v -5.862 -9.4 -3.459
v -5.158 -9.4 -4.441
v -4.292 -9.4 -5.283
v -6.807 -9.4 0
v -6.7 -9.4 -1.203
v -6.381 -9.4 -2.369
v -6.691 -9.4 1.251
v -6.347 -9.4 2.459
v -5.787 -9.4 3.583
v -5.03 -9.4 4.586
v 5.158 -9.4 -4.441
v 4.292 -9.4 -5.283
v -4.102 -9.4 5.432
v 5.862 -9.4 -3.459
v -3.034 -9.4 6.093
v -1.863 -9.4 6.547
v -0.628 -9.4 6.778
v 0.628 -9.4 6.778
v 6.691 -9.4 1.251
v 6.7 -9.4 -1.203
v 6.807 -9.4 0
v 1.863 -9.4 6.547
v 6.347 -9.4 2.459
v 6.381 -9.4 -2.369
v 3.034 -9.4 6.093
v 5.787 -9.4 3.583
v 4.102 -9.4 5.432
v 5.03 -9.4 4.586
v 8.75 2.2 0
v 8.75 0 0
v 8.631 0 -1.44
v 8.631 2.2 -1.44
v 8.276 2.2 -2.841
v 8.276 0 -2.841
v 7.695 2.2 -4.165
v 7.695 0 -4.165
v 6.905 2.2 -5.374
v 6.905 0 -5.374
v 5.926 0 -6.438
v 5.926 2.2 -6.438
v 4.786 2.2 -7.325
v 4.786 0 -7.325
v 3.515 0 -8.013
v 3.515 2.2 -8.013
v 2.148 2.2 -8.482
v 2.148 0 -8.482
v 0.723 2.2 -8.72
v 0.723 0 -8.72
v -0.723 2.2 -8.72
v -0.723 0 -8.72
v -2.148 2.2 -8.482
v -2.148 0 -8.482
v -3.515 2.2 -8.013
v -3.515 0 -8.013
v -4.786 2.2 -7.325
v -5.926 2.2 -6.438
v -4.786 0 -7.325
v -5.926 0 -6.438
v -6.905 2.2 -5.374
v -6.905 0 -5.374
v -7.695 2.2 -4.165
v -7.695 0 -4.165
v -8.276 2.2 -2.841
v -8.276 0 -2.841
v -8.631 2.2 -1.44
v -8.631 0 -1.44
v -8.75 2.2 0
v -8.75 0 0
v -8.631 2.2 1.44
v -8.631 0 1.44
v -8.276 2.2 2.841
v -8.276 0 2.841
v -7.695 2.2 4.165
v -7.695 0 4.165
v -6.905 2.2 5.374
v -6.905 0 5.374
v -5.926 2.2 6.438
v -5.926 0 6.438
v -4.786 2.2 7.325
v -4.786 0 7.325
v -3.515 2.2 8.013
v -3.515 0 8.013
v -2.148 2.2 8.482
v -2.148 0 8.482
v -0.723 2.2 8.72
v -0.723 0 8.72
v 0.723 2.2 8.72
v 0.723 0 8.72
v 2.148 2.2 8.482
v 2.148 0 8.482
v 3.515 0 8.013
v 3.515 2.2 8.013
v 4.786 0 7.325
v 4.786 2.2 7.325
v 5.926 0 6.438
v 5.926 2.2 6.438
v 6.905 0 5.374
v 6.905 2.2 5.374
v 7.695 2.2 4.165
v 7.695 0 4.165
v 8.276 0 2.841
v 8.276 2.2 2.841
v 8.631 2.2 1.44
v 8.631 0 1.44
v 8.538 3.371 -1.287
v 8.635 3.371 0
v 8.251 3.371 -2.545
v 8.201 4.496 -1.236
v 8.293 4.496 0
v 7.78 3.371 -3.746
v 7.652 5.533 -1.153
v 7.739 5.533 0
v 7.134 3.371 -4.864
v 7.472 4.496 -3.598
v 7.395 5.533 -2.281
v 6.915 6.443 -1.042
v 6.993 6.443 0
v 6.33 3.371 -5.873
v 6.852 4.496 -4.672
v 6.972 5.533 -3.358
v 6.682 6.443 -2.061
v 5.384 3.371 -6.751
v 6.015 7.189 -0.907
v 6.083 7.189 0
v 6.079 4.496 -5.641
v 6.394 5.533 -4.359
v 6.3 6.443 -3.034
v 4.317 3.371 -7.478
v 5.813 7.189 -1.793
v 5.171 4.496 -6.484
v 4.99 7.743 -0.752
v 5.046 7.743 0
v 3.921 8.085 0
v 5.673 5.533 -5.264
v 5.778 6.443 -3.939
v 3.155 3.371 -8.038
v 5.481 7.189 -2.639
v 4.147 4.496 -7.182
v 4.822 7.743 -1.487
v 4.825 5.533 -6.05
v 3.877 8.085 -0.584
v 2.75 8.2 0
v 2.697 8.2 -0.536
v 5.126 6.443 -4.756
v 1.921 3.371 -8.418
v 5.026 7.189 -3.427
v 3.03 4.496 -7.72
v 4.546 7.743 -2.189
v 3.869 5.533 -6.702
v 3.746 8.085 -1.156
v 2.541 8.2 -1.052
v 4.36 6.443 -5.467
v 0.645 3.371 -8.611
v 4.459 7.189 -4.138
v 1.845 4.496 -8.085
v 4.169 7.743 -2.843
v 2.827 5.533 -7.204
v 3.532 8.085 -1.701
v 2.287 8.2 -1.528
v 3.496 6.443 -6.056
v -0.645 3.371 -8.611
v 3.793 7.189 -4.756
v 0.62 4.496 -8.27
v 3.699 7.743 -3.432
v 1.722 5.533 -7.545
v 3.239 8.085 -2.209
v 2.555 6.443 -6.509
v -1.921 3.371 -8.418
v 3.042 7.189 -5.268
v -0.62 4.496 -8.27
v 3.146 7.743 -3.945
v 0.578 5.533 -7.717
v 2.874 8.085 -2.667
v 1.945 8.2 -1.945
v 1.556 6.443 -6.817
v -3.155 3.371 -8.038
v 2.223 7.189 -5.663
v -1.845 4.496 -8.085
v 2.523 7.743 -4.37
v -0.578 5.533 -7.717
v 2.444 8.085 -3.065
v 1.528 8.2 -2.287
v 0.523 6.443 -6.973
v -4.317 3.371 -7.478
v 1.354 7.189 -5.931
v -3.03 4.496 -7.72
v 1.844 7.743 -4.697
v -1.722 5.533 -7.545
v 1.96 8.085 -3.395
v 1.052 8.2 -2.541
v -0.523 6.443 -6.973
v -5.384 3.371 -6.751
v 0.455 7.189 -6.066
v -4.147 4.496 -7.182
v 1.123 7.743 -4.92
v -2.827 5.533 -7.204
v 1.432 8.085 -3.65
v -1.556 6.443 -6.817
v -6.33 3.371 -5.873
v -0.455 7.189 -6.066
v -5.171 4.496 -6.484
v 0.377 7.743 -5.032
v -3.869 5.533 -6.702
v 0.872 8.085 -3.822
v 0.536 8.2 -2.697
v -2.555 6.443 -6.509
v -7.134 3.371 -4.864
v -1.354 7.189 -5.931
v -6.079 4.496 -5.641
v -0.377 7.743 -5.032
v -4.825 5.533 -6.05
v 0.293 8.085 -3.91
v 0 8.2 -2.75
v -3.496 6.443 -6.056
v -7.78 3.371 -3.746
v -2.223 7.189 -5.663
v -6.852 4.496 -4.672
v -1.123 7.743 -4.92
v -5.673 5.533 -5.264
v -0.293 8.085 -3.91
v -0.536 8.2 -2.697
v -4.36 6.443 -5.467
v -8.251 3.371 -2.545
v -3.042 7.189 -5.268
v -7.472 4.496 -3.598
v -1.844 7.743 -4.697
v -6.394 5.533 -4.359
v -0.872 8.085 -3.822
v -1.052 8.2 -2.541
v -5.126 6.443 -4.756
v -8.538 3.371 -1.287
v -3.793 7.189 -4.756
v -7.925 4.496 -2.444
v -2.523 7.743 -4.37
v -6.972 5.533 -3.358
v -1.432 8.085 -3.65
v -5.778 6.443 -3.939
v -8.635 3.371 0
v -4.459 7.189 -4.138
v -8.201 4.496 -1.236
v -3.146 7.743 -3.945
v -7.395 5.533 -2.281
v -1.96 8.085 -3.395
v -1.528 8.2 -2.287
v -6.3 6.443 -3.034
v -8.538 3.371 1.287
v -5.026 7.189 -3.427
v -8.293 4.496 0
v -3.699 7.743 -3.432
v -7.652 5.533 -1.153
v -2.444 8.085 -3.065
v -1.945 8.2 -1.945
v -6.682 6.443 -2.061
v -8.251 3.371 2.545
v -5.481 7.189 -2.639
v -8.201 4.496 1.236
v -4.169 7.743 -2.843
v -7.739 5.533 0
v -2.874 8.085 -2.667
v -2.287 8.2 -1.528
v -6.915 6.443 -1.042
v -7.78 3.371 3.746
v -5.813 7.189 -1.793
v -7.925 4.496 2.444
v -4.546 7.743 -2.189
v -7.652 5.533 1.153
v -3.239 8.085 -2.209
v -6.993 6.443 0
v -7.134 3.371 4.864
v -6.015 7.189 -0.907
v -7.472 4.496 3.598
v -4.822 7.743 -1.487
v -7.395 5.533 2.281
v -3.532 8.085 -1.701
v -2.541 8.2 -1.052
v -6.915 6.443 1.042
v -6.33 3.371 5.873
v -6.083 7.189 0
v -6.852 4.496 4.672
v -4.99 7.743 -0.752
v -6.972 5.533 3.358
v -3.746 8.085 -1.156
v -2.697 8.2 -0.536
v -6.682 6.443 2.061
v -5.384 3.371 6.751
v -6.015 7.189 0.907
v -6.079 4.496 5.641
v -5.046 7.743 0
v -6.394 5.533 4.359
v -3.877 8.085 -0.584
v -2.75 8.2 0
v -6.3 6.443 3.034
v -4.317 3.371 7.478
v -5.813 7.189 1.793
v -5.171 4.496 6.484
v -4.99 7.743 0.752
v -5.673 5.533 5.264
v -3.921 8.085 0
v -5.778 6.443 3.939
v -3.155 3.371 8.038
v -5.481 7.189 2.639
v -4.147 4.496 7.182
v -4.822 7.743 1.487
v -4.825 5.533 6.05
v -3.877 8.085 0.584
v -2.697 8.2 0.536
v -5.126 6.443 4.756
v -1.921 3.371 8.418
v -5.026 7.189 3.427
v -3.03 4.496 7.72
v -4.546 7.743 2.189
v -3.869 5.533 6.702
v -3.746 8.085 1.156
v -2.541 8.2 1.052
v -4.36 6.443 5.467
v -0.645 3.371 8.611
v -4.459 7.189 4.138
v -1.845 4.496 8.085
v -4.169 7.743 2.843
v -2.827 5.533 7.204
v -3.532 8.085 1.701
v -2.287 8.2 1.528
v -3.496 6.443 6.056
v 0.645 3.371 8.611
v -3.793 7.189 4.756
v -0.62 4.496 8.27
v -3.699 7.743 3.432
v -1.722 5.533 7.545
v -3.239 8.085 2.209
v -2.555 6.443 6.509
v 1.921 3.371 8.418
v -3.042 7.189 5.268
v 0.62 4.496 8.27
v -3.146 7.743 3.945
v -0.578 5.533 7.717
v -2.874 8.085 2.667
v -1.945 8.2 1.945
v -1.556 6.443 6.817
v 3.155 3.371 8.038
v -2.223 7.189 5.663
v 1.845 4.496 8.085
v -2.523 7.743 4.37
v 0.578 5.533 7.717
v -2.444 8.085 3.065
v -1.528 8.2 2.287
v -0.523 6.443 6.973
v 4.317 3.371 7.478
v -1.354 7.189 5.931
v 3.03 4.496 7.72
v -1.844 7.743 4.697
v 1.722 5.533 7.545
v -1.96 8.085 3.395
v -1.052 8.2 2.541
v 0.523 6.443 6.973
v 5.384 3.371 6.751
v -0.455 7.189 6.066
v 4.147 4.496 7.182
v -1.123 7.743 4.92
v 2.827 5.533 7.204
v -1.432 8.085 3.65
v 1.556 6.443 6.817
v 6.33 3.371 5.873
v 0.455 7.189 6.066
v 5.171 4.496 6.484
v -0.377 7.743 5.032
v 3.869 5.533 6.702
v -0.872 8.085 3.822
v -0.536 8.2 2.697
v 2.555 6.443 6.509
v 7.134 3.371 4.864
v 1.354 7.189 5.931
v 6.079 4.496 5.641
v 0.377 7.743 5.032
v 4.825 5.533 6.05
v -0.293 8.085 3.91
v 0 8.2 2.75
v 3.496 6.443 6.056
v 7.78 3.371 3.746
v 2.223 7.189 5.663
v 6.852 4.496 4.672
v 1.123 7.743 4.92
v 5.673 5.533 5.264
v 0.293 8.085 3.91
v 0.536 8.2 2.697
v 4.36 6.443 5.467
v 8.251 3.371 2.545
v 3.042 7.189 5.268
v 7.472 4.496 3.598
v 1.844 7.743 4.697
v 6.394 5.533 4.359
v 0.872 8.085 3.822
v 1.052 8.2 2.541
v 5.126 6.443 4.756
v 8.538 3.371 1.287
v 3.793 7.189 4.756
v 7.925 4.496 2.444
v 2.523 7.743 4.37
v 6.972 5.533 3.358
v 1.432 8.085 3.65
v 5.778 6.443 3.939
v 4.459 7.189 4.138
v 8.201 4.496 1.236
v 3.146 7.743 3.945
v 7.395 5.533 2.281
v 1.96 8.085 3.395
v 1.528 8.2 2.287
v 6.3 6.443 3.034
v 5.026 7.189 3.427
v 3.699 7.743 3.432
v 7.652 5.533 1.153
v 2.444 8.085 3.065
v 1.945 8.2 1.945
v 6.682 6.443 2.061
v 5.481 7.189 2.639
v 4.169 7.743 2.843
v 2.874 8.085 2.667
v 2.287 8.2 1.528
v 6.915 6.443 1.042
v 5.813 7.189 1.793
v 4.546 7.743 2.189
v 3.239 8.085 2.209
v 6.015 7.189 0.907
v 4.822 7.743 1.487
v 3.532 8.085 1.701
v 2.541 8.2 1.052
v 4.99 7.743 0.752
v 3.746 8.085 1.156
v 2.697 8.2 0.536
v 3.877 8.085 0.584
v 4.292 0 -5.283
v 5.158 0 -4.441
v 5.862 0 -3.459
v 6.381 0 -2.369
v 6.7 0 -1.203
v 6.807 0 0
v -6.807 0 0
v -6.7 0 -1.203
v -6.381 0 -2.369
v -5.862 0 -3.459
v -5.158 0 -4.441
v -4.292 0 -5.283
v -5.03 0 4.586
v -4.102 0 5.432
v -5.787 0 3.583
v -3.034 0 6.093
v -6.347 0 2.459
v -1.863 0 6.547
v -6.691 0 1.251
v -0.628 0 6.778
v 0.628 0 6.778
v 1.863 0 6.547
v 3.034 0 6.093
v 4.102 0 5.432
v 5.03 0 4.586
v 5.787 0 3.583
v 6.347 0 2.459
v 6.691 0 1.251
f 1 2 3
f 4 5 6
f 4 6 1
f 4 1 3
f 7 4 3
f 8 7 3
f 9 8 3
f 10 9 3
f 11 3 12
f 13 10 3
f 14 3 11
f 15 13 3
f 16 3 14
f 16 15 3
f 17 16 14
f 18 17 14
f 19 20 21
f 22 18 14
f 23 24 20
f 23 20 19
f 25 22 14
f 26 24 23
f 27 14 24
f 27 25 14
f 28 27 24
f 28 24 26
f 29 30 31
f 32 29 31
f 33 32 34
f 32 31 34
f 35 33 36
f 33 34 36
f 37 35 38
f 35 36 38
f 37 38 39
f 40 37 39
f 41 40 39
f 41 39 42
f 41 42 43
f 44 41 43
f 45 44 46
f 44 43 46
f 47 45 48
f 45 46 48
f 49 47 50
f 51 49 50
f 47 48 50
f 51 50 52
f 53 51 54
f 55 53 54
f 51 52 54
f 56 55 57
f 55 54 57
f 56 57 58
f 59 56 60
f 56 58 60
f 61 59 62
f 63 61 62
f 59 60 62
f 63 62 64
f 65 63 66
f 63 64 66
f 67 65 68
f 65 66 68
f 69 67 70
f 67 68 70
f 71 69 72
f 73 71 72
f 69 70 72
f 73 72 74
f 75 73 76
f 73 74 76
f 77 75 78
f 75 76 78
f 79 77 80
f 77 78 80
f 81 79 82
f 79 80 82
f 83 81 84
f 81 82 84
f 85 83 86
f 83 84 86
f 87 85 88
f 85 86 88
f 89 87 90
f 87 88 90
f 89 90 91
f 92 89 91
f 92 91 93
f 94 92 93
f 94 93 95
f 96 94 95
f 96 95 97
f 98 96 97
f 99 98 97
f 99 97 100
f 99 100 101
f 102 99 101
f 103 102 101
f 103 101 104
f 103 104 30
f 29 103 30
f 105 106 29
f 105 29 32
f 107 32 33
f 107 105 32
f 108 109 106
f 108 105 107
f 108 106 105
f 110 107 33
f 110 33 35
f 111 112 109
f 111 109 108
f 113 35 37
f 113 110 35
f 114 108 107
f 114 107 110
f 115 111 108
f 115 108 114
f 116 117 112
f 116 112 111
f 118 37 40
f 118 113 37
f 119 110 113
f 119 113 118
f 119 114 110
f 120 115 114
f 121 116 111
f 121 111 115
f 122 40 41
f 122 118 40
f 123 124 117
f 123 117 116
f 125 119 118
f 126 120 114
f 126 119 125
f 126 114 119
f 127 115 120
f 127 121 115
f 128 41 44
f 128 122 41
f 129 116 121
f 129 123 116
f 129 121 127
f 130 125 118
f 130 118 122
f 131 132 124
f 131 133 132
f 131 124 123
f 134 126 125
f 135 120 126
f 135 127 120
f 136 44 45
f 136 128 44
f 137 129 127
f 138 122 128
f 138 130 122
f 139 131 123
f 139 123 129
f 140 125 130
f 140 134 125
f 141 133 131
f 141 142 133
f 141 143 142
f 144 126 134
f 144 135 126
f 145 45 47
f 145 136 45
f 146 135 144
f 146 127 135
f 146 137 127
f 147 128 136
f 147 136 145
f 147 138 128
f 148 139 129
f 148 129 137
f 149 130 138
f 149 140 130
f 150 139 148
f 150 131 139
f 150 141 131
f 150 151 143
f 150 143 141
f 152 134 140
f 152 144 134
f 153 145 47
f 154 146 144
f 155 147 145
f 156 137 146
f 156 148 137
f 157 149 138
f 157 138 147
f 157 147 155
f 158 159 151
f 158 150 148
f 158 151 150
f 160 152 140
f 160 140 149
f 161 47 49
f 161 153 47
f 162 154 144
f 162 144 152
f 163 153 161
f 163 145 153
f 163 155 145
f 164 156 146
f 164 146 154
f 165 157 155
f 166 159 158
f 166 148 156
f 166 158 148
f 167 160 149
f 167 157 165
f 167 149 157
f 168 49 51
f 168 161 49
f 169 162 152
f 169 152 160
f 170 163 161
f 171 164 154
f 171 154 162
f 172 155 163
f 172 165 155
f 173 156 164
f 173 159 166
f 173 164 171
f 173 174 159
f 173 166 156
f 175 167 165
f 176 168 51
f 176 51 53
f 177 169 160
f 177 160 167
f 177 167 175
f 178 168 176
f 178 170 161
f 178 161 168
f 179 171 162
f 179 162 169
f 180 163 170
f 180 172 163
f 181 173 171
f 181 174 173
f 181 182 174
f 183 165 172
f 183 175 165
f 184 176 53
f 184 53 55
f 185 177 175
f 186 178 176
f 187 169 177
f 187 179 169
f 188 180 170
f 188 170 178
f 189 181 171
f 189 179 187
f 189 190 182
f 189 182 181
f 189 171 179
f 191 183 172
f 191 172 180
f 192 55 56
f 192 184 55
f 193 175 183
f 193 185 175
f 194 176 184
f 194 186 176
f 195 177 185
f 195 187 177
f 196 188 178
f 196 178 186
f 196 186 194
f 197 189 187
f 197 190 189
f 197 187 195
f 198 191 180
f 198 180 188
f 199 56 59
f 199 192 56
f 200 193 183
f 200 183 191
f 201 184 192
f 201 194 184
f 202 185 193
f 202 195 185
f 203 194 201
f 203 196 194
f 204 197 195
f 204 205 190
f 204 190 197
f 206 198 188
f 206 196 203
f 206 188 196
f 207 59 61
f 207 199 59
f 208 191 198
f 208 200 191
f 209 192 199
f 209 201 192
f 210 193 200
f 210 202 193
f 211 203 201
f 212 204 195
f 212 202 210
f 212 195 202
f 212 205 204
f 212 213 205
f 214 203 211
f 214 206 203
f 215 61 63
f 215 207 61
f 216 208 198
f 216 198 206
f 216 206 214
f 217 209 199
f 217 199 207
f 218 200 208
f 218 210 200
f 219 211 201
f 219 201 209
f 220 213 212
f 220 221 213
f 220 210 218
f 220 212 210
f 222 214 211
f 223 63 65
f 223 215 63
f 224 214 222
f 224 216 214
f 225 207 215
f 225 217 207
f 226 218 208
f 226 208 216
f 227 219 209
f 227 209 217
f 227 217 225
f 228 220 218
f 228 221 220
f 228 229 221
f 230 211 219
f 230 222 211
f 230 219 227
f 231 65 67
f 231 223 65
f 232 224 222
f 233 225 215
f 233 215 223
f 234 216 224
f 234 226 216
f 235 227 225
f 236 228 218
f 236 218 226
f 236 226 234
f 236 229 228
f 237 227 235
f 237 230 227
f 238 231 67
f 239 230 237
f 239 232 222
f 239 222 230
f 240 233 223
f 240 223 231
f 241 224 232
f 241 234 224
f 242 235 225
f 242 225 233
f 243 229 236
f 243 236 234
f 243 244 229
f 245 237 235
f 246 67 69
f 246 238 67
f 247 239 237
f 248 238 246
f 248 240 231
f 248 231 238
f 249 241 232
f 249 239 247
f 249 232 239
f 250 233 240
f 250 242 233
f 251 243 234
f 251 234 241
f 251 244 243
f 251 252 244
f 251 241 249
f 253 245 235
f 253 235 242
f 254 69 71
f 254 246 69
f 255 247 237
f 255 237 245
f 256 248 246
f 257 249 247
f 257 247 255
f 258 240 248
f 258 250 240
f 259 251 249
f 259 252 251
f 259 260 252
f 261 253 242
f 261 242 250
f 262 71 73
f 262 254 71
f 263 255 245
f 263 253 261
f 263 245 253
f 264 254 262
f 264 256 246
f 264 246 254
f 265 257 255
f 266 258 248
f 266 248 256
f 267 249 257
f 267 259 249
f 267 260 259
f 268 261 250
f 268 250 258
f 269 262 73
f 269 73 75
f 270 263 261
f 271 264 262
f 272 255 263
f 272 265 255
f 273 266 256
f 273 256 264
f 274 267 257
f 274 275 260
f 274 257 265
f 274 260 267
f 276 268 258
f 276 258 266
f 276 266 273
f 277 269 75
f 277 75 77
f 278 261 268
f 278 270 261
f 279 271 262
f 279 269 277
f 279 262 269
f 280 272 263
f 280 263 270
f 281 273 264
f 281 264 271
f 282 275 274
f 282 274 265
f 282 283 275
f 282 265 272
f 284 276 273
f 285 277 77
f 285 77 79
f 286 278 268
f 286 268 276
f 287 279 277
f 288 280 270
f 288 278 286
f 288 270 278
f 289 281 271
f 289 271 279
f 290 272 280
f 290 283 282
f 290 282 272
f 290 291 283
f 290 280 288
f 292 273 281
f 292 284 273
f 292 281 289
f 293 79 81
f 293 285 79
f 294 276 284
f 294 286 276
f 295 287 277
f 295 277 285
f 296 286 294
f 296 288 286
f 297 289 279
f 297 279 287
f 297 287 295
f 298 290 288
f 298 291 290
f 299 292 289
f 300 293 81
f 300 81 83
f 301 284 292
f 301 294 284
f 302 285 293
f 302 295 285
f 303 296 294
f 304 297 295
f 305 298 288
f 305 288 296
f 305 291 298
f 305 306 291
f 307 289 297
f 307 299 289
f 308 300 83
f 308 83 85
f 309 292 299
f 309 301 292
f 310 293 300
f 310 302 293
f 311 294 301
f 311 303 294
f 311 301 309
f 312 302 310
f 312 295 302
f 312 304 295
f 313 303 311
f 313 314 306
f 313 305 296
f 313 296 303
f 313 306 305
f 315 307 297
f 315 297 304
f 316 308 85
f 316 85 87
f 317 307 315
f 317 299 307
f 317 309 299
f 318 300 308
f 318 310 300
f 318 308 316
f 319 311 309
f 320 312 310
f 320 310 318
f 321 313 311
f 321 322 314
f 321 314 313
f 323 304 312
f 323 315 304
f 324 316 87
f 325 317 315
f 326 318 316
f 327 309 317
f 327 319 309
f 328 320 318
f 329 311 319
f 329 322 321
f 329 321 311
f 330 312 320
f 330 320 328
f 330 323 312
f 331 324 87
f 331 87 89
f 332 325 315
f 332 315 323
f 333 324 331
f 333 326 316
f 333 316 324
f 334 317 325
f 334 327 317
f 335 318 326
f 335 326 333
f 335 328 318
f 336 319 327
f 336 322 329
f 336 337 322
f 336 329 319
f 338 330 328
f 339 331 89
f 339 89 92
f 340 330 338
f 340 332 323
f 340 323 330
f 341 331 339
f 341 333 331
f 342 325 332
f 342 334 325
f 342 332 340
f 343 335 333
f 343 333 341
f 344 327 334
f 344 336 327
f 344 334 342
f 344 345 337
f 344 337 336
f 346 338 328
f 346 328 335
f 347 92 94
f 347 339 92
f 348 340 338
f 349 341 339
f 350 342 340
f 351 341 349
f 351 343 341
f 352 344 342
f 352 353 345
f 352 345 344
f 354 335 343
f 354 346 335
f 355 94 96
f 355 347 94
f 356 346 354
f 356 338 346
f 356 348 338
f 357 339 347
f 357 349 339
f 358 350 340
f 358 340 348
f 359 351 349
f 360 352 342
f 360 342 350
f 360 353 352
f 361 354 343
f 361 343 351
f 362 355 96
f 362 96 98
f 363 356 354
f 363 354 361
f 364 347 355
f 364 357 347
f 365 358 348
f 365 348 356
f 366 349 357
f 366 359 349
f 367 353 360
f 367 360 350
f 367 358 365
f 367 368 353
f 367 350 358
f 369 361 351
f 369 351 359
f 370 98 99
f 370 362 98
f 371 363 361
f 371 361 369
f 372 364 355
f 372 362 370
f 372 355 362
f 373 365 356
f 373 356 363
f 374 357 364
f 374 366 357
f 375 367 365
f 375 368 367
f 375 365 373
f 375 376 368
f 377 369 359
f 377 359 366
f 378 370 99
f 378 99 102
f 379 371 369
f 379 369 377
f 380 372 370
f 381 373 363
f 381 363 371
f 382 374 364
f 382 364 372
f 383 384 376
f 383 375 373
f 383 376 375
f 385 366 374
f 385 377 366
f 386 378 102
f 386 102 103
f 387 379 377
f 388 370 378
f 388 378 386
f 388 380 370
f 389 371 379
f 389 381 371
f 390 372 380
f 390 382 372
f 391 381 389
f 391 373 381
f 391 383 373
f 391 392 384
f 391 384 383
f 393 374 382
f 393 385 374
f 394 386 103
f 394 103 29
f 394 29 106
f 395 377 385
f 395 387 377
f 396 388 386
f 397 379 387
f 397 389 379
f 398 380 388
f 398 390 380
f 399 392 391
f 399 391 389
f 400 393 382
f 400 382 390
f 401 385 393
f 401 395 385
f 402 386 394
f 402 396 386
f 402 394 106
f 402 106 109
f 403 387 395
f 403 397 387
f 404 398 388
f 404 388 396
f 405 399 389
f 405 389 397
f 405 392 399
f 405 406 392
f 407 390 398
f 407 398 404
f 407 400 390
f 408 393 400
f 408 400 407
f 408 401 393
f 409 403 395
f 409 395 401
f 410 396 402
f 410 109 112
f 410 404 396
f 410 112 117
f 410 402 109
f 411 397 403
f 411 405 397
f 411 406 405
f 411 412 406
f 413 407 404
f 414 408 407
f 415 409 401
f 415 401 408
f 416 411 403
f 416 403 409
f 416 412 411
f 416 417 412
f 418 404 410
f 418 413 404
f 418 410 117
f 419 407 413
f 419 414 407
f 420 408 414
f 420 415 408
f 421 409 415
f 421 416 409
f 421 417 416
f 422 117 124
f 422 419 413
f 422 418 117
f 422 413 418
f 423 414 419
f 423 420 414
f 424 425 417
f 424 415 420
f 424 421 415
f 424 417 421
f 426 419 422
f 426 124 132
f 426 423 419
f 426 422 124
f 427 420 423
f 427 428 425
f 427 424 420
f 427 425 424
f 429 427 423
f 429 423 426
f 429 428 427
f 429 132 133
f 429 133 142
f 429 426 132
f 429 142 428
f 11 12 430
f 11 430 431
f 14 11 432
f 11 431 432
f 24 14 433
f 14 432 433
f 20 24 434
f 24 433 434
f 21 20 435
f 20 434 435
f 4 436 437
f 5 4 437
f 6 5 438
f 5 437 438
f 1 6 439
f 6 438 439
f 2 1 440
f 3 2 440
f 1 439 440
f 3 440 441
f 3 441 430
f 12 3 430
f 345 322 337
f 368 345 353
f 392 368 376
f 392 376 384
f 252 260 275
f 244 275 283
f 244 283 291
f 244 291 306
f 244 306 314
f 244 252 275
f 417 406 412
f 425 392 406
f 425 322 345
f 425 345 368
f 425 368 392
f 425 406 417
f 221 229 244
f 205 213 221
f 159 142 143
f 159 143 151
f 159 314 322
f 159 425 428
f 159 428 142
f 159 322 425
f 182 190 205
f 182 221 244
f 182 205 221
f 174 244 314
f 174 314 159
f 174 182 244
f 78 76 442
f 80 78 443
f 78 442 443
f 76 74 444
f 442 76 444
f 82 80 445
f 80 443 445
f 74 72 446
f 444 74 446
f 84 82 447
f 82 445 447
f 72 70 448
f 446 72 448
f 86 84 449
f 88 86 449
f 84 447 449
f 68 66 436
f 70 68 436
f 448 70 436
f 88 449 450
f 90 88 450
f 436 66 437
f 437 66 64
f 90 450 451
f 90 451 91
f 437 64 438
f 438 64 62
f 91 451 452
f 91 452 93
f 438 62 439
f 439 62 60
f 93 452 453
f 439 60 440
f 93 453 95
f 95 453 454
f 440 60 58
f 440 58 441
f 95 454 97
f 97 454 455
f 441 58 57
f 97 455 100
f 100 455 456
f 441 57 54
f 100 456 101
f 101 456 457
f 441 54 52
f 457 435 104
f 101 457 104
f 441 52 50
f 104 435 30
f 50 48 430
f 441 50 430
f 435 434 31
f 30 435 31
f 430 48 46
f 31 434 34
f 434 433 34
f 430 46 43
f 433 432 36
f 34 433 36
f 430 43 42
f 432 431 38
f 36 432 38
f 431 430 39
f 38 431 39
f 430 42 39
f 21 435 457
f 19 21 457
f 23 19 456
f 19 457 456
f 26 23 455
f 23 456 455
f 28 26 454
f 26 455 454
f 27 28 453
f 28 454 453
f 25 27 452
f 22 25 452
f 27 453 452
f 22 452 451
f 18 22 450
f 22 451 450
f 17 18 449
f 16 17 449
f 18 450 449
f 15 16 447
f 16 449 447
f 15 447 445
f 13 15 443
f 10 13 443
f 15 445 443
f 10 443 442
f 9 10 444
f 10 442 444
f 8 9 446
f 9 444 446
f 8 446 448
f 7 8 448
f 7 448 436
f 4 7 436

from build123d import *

# Parameters (mm, degrees)
SKETCH1_R           = 8.75
BOSS_EXTRUDE1_DEPTH = 8.2
FILLET1_R           = 6
BOSS_EXTRUDE2_DEPTH = 9.4


with BuildPart() as part:
    # Sketch1 → Boss-Extrude1 (new body)
    with BuildSketch(Plane(origin=(0, 0, 0), x_dir=(1, 0, 0), z_dir=(0, 1, 0))):
        Circle(SKETCH1_R)
    extrude(amount=BOSS_EXTRUDE1_DEPTH)

    # Fillet1
    fillet1_edges = [part.edges().sort_by_distance(p)[0] for p in [
        (-8.75, 8.2, 0),
    ]]
    fillet(fillet1_edges, radius=FILLET1_R)

    # Sketch2 → Boss-Extrude2 (add)
    with BuildSketch(Plane.XZ):
        with BuildLine():
            ThreePointArc((4.292019342, -5.283154258), (6.146066324, -2.925579889), (6.806845742, 0))
            ThreePointArc((6.806845742, 0), (1.4e-08, 6.806845742), (-6.806845742, 2.9e-08))
            ThreePointArc((-6.806845742, 2.9e-08), (-6.146066331, -2.925579876), (-4.292019342, -5.283154258))
            Line((-4.292019342, -5.283154258), (4.292019342, -5.283154258))
        make_face()
    extrude(amount=BOSS_EXTRUDE2_DEPTH)


solid = part.part
